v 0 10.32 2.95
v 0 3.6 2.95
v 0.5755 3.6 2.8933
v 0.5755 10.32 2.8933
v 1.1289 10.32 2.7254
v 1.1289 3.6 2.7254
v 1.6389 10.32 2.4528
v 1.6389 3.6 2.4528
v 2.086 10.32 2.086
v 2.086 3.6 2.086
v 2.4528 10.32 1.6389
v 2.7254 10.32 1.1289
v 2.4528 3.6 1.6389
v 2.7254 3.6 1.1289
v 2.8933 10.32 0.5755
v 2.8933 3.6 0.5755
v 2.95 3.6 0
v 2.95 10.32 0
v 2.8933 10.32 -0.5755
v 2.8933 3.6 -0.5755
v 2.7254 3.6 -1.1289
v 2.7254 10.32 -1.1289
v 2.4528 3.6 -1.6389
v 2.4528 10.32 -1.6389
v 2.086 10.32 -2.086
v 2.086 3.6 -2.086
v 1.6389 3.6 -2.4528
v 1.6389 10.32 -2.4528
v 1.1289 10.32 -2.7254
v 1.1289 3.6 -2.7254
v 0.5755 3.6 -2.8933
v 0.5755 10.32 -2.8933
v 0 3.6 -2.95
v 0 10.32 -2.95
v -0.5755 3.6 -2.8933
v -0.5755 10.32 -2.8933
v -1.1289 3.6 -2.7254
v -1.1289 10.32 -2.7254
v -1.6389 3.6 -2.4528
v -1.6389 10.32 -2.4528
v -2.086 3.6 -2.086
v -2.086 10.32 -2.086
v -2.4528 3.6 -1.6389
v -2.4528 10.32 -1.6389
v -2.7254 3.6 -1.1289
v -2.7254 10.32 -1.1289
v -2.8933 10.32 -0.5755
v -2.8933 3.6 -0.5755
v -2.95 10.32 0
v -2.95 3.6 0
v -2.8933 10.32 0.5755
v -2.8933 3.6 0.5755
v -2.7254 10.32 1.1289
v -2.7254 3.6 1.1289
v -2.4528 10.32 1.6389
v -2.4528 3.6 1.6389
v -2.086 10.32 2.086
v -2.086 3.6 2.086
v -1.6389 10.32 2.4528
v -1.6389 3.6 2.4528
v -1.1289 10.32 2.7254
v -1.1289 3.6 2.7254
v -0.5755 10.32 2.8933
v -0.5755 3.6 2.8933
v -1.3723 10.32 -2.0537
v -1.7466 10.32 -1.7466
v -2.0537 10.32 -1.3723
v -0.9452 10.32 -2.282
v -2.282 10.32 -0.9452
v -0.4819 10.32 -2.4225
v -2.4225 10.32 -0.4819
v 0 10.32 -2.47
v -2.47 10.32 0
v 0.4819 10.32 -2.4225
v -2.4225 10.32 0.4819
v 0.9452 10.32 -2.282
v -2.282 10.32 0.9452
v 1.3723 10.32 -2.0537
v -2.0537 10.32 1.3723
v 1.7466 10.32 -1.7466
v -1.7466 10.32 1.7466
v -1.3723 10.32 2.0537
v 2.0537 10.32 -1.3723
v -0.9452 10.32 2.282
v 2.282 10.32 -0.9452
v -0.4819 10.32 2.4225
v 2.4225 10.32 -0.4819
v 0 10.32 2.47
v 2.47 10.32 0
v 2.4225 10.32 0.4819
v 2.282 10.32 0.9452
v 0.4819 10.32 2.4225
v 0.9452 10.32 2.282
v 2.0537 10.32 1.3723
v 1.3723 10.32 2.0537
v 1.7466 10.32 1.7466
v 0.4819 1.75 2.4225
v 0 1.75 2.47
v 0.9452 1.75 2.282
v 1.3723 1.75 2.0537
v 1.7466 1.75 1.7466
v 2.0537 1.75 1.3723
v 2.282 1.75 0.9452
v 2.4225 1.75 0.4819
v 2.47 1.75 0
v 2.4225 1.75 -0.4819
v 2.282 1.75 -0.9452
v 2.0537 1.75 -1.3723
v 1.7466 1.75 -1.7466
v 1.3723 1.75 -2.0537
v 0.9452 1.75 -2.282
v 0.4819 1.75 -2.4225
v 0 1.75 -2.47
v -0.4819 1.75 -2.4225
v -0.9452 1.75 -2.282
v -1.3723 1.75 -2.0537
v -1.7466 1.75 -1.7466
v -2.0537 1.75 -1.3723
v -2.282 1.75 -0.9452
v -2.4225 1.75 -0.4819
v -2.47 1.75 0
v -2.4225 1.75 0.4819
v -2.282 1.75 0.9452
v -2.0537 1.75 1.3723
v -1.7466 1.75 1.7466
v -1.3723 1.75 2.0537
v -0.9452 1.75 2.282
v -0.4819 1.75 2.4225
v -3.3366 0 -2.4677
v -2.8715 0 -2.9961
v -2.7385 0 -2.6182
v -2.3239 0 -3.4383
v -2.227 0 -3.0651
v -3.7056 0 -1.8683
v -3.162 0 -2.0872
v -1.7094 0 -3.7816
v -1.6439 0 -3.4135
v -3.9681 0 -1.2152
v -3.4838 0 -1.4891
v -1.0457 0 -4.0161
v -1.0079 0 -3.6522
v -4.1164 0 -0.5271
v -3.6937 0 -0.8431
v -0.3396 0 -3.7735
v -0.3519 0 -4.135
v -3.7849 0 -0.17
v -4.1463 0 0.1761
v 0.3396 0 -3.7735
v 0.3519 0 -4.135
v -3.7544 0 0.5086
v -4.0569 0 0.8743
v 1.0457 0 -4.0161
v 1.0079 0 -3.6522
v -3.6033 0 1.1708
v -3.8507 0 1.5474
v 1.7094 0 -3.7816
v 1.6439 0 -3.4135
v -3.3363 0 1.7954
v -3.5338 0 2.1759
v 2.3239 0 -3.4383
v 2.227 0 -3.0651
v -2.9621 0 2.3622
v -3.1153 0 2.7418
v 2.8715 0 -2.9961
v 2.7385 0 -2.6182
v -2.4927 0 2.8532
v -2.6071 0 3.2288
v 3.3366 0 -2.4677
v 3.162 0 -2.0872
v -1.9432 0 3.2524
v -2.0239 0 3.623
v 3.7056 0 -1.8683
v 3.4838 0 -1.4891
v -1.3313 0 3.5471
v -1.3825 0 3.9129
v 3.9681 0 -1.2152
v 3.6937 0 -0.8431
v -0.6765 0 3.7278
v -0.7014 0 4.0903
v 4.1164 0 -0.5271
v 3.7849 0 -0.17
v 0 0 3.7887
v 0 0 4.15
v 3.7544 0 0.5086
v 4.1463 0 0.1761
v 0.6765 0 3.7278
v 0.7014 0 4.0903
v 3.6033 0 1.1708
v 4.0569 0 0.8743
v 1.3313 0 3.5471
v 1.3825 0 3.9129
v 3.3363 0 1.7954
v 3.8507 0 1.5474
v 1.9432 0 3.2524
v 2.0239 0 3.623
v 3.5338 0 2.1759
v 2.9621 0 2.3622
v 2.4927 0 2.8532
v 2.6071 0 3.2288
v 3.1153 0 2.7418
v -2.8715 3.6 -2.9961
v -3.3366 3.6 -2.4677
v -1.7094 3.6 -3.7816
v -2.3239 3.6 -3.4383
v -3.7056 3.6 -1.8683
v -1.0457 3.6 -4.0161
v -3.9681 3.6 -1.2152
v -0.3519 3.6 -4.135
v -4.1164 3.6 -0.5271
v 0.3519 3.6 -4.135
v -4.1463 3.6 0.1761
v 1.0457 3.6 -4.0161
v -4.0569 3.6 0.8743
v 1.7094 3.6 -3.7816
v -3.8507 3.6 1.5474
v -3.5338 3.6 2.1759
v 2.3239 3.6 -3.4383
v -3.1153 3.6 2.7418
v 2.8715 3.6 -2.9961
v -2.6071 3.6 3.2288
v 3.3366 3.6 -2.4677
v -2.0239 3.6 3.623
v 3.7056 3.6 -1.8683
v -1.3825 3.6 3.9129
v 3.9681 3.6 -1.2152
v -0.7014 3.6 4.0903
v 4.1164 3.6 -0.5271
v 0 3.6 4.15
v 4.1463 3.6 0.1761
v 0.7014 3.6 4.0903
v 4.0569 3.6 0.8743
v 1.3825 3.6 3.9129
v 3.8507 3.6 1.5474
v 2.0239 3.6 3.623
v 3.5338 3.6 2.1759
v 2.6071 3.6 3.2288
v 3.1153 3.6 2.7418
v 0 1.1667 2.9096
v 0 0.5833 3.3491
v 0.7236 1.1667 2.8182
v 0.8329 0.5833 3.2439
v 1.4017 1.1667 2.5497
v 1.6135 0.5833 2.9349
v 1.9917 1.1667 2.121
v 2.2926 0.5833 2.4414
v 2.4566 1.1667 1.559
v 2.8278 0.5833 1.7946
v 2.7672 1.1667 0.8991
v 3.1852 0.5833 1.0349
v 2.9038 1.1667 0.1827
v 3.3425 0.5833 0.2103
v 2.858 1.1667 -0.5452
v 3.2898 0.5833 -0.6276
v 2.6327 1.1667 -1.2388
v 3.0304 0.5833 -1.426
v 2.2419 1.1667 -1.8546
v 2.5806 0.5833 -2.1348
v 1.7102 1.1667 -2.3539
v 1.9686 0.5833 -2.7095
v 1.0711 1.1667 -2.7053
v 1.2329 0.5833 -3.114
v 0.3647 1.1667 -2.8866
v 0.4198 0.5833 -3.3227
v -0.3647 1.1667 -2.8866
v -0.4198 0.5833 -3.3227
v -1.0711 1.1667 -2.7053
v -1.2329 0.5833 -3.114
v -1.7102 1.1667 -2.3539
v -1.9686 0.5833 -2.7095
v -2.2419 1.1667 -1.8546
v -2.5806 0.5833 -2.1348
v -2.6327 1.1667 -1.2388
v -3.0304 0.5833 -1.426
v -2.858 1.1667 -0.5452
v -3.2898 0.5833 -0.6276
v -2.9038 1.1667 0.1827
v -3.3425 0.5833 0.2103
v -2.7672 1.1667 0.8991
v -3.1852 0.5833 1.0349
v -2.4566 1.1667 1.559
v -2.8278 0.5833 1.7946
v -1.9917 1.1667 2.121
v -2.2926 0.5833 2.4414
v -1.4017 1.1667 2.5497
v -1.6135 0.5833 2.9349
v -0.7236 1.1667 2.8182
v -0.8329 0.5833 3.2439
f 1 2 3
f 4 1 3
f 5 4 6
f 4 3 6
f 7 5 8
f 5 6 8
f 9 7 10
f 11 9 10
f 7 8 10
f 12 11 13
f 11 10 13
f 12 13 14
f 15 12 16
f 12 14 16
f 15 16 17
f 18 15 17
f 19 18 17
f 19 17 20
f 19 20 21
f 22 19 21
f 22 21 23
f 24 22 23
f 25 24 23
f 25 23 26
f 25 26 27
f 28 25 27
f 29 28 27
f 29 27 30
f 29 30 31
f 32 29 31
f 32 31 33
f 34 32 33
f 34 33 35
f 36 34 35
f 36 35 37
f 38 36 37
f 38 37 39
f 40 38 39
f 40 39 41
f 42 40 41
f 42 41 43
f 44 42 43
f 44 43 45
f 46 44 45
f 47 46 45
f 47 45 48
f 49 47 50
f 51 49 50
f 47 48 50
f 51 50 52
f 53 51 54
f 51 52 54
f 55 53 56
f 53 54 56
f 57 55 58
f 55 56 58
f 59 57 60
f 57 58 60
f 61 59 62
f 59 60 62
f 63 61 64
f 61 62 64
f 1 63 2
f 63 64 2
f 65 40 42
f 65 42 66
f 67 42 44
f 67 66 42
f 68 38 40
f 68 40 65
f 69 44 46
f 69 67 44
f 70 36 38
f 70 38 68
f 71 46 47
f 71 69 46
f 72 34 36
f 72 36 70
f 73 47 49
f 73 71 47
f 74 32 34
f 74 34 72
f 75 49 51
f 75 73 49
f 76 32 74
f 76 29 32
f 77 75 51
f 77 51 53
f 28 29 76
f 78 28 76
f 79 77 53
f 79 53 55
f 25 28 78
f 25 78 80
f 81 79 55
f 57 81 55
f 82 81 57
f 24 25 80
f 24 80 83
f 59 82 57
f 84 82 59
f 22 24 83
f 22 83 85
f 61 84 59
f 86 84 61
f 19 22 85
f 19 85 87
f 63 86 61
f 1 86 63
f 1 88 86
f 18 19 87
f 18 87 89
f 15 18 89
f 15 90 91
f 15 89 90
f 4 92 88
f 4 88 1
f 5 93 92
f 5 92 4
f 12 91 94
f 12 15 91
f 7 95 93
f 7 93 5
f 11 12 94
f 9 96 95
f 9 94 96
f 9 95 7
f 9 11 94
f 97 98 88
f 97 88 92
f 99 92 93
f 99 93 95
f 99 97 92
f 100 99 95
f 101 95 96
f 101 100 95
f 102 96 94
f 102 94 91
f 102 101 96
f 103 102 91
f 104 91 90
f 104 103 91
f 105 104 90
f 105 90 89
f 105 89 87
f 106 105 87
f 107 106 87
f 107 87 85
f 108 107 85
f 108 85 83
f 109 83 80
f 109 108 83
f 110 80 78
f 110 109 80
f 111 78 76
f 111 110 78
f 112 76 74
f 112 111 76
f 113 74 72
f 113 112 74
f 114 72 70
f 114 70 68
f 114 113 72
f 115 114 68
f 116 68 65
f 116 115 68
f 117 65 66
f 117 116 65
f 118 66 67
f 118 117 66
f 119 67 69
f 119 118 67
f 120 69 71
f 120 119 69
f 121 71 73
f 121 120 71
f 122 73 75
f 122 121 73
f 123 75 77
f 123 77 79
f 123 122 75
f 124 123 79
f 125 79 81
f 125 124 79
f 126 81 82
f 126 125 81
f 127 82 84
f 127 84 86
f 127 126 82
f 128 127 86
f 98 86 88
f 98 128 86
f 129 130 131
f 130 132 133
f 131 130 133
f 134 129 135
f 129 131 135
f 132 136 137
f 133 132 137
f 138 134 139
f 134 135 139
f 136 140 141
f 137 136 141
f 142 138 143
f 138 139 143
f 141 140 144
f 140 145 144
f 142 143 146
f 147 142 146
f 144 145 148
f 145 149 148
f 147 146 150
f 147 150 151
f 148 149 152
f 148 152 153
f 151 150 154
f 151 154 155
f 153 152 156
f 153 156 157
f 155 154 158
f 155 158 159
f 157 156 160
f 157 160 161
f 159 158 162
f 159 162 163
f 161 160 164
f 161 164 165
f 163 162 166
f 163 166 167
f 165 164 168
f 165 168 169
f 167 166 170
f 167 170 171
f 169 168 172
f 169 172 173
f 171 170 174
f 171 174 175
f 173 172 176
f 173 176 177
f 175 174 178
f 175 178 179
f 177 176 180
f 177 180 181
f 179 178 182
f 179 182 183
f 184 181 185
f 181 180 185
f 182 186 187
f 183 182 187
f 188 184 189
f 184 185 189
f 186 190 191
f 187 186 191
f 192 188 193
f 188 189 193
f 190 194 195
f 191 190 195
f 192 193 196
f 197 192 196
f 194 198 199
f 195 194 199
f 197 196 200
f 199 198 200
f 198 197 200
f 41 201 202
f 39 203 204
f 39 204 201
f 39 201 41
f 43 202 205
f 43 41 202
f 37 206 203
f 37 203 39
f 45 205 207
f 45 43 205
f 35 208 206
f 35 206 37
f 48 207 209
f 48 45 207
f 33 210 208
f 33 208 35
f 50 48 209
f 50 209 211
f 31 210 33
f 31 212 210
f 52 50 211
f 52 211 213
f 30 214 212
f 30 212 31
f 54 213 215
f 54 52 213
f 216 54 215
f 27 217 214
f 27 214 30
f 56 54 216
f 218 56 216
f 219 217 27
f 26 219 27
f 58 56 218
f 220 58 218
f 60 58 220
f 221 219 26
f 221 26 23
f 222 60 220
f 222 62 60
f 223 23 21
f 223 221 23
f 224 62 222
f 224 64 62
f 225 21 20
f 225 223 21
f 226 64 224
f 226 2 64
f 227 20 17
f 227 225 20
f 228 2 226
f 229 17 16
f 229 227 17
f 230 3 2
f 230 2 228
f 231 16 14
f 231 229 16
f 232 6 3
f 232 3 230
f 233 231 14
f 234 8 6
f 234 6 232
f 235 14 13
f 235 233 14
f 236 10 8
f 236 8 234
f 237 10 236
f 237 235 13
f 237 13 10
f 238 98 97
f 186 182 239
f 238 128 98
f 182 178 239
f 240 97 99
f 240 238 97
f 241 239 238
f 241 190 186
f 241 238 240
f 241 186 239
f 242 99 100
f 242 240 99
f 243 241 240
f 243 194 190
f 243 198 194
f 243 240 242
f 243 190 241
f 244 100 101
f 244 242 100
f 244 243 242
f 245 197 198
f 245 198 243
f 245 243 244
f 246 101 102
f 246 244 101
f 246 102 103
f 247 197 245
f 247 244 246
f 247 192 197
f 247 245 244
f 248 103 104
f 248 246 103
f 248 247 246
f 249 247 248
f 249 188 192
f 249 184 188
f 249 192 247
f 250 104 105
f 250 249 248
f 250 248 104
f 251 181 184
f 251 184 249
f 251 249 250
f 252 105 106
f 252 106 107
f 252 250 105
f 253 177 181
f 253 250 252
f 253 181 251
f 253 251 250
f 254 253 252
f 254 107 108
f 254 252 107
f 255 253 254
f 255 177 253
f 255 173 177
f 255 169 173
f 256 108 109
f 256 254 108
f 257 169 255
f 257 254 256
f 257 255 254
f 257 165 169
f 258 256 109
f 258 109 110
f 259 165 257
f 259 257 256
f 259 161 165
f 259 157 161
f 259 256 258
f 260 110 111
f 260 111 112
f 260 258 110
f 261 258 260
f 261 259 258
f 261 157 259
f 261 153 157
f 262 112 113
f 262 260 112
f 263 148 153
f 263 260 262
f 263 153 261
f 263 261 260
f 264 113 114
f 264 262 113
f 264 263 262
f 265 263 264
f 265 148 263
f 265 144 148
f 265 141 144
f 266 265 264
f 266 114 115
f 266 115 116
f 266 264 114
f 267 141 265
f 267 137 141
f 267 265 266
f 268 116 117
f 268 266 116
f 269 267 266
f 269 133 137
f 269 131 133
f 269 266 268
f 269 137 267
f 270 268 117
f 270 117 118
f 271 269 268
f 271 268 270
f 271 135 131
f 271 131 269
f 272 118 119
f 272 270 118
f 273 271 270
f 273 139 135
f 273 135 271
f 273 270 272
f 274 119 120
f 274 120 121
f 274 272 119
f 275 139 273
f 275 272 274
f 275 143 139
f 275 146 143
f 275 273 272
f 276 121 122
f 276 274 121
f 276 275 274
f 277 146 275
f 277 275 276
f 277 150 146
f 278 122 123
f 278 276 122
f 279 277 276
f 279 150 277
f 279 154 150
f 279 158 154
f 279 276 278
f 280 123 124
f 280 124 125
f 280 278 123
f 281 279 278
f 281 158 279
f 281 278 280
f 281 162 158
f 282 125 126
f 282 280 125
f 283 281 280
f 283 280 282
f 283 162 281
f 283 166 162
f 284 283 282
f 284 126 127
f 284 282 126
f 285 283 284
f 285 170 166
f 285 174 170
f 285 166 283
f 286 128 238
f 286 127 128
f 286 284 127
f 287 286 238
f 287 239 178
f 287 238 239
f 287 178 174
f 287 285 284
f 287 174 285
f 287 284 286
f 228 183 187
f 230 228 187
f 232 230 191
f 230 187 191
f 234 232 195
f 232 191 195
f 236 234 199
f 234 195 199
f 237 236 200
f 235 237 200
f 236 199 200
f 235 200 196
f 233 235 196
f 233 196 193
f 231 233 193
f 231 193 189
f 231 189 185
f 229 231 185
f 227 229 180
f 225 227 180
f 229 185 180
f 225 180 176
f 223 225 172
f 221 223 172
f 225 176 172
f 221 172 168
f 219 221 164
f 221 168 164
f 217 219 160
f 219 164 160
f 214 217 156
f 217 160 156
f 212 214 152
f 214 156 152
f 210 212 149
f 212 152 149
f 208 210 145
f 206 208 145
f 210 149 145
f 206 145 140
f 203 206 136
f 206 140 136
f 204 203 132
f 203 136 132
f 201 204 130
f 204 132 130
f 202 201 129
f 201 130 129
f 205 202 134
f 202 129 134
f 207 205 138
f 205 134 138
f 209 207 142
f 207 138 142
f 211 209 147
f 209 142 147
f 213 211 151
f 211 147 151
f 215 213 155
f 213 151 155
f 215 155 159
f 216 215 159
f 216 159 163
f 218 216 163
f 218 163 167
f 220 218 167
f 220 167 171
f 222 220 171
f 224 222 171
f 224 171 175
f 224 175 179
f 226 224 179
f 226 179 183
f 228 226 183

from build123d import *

# Parameters (mm, degrees)
SKETCH1_R           = 4.15
SKETCH1_R_2         = 2.95
BOSS_EXTRUDE1_DEPTH = 3.6
SKETCH1_3_R         = 2.95
SKETCH1_3_R_2       = 2.47
BOSS_EXTRUDE2_DEPTH = 10.32
CHAMFER1_SIZE       = 1.75
CHAMFER1_SIZE2      = 1.318719588


with BuildPart() as part:
    # Sketch1 → Boss-Extrude1 (new body)
    with BuildSketch(Plane(origin=(0, 0, 0), x_dir=(1, 0, 0), z_dir=(0, 1, 0))):
        Circle(SKETCH1_R)
        Circle(SKETCH1_R_2, mode=Mode.SUBTRACT)
    extrude(amount=BOSS_EXTRUDE1_DEPTH)

    # Sketch1<3> → Boss-Extrude2 (add)
    with BuildSketch(Plane(origin=(0, 0, 0), x_dir=(1, 0, 0), z_dir=(0, 1, 0))):
        Circle(SKETCH1_3_R)
        Circle(SKETCH1_3_R_2, mode=Mode.SUBTRACT)
    extrude(amount=BOSS_EXTRUDE2_DEPTH)

    # Chamfer1
    chamfer1_edges = [part.edges().sort_by_distance(p)[0] for p in [
        (-2.47, 0, 0),
    ]]
    chamfer1_side = [part.faces().sort_by_distance(p)[0] for p in [
        (-2.47, 5.16, 0),
    ]]
    chamfer(chamfer1_edges, length=CHAMFER1_SIZE, length2=CHAMFER1_SIZE2, reference=chamfer1_side[0])


solid = part.part
